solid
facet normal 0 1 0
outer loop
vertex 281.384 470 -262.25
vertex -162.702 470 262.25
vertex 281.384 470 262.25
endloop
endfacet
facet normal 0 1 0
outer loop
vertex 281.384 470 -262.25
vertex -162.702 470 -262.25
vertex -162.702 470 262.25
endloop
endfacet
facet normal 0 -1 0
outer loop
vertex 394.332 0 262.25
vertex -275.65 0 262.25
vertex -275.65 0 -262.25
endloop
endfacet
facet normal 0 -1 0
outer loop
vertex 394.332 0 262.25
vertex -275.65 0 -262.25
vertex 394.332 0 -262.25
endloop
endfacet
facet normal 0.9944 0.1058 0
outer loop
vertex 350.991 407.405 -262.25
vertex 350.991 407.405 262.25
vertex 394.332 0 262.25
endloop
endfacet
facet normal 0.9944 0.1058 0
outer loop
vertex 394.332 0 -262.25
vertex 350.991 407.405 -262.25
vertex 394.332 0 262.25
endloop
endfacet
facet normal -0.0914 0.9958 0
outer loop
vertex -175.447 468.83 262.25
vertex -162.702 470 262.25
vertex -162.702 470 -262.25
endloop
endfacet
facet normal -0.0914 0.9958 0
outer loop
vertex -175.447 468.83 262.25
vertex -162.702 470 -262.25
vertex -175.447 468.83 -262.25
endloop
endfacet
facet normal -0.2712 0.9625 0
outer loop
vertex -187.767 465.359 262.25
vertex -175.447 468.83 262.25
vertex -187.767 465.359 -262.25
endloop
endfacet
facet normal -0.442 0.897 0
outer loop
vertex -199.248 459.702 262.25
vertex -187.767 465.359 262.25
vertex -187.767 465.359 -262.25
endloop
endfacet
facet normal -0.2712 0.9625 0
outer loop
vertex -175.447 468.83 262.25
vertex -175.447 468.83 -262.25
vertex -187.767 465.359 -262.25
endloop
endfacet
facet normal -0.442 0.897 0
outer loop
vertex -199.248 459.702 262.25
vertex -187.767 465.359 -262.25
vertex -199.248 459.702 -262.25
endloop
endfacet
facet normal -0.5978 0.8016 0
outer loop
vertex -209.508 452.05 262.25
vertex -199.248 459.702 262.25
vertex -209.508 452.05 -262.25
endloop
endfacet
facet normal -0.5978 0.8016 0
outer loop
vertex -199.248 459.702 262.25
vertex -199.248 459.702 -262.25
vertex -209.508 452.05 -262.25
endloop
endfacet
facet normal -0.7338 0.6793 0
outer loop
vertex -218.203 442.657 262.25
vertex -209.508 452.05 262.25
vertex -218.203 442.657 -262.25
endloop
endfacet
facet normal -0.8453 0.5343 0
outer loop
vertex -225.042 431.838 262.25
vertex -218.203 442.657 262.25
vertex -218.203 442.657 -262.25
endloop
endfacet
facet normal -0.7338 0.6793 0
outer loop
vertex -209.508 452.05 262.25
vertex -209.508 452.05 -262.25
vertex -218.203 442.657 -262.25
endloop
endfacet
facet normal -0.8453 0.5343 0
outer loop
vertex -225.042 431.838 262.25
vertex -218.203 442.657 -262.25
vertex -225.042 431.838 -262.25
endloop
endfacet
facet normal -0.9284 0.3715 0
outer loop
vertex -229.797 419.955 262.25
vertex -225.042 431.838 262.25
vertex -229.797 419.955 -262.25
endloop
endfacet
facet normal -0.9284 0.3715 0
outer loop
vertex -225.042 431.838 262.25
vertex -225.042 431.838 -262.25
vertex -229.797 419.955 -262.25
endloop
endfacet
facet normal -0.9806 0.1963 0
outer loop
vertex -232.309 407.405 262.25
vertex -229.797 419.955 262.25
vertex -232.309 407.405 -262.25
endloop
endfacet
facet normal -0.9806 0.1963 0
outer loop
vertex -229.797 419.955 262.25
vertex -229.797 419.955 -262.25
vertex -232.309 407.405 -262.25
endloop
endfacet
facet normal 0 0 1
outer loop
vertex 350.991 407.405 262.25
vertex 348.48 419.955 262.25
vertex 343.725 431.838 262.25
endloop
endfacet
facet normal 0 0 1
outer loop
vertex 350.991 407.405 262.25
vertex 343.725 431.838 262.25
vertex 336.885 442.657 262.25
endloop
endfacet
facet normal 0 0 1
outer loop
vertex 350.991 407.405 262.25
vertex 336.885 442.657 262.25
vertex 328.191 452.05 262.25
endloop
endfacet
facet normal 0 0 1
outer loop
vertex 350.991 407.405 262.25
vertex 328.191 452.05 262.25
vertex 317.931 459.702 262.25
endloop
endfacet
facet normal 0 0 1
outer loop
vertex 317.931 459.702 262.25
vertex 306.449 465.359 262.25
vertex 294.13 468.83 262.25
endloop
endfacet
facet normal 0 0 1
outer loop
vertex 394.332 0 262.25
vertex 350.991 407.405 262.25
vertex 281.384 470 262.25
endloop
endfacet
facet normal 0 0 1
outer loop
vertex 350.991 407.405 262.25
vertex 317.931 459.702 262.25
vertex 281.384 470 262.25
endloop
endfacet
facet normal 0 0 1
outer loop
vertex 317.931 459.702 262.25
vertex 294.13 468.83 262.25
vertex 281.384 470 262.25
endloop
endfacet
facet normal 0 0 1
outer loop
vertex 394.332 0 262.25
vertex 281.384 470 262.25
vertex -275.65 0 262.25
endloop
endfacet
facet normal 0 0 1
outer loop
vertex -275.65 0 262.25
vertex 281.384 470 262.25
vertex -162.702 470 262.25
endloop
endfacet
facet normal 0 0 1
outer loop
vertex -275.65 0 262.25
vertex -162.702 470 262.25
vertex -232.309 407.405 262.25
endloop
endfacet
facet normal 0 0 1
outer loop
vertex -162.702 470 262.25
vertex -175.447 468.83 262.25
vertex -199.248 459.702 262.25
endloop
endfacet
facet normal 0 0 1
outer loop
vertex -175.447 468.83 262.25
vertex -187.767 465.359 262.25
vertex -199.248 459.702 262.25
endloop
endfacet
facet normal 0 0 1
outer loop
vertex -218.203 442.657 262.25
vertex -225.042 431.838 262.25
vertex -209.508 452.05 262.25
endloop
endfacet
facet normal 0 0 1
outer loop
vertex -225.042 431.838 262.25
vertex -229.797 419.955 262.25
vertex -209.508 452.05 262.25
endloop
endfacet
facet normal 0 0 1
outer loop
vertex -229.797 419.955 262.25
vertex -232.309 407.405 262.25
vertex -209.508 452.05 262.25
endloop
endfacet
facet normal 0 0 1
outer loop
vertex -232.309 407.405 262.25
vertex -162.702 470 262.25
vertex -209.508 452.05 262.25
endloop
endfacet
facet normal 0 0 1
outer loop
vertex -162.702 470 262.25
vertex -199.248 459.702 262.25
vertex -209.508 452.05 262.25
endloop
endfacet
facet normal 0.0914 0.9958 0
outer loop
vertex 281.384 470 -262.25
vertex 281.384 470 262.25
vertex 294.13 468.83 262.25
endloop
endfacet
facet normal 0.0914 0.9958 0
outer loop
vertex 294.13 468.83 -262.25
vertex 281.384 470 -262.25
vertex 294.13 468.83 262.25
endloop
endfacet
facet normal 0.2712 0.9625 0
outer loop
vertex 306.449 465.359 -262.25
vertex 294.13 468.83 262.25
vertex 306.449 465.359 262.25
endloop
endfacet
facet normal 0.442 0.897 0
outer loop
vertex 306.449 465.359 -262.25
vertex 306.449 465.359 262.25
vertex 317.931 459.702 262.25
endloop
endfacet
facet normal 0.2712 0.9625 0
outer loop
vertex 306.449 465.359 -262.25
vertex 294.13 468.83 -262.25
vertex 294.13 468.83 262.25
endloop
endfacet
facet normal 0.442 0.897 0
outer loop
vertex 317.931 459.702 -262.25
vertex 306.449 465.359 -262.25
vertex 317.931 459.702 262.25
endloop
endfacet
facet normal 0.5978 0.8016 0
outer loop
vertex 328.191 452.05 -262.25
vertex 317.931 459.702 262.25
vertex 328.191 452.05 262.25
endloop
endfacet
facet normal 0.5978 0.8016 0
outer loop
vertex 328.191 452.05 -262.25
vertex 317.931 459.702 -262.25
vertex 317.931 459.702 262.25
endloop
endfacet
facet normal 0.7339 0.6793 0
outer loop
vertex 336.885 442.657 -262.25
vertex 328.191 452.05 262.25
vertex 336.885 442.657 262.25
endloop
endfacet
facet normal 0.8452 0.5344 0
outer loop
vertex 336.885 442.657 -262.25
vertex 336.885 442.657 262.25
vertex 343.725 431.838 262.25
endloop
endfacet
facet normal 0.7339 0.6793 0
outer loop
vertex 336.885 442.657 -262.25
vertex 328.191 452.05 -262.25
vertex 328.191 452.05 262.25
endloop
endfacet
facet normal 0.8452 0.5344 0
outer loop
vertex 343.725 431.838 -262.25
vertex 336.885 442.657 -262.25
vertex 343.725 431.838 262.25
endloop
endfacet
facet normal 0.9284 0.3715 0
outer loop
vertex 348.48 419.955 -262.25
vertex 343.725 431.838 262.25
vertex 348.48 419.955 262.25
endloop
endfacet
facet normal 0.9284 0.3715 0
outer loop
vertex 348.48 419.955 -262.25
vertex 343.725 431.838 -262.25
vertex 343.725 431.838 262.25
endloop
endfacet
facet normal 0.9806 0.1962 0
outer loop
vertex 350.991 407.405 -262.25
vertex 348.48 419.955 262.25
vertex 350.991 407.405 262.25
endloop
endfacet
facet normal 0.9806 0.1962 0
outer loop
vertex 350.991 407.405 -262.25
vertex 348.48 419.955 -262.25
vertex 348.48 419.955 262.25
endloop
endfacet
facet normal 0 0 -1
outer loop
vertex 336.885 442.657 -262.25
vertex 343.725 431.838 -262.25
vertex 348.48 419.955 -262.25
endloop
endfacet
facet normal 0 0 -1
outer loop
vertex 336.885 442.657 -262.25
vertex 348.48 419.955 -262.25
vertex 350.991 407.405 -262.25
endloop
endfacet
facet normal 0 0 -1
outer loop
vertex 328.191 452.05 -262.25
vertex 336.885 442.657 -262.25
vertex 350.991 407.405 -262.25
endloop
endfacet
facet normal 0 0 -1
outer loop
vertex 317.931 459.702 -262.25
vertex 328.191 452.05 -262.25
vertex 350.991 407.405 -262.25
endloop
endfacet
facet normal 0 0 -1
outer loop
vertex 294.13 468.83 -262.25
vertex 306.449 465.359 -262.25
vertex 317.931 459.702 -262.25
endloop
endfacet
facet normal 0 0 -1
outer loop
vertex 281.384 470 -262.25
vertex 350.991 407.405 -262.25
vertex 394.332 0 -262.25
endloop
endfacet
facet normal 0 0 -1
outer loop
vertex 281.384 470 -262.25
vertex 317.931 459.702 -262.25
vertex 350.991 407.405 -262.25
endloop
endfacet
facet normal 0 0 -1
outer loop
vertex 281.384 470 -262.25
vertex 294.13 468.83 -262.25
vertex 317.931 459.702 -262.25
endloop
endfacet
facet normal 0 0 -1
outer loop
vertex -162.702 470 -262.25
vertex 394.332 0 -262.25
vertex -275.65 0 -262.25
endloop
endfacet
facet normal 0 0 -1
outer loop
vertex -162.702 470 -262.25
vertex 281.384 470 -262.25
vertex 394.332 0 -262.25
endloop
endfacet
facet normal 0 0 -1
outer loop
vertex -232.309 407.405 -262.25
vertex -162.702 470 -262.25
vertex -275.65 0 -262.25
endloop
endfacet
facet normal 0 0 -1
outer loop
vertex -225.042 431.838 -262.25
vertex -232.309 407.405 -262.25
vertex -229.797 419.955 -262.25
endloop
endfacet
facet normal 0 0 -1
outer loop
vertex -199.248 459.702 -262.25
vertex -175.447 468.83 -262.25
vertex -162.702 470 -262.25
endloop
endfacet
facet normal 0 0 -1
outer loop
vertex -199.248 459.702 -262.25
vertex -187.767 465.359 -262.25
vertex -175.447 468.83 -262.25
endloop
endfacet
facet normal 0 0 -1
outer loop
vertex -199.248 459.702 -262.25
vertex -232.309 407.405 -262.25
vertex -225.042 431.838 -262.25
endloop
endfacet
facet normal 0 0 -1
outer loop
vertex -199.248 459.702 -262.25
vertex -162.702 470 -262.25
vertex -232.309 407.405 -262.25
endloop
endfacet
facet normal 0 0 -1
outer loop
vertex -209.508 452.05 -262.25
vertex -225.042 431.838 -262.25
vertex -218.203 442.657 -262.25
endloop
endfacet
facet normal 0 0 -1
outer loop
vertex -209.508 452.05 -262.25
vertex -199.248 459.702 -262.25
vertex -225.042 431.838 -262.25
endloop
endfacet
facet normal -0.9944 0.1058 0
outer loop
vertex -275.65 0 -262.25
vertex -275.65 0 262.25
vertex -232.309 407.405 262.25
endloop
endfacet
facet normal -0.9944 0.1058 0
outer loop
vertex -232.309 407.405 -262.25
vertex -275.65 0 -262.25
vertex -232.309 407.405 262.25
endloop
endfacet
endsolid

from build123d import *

# Parameters (mm, degrees)
BOSS_EXTRUDE3_DEPTH = 370
SKETCH3_W           = 569.98245323
SKETCH3_H           = 524.5
BOSS_EXTRUDE4_DEPTH = 100
BOSS_EXTRUDE5_DEPTH = 524.5
FILLET3_R           = 70


with BuildPart() as part:
    # Sketch1 → Boss-Extrude3 (new body)
    with BuildSketch(Plane(origin=(0, 0, 0), x_dir=(1, 0, 0), z_dir=(0, 1, 0))):
        Polygon((225.65, -262.25), (344.33245323, -262.25), (344.33245323, 262.25), (225.65, 262.25), (-225.65, 262.25), (-225.65, -262.25), align=None)
    extrude(amount=BOSS_EXTRUDE3_DEPTH)

    # Sketch3 → Boss-Extrude4 (add)
    with BuildSketch(Plane(origin=(0, 370, 0), x_dir=(1, 0, 0), z_dir=(0, 1, 0))):
        with Locations((59.341226615, 0)):
            Rectangle(SKETCH3_W, SKETCH3_H)
    extrude(amount=BOSS_EXTRUDE4_DEPTH)

    # Sketch6 → Boss-Extrude5 (add, through all)
    with BuildSketch(Plane.XY.offset(262.25)):
        Polygon((-225.65, 0), (-275.65, 0), (-225.65, 470), (344.33245323, 470), (394.33245323, 0), (344.33245323, 0), align=None)
    extrude(amount=-BOSS_EXTRUDE5_DEPTH)

    # Fillet3
    fillet3_edges = [part.edges().sort_by_distance(p)[0] for p in [
        (-225.65, 470, 0),
        (344.33245323, 470, 0),
    ]]
    fillet(fillet3_edges, radius=FILLET3_R)


solid = part.part
